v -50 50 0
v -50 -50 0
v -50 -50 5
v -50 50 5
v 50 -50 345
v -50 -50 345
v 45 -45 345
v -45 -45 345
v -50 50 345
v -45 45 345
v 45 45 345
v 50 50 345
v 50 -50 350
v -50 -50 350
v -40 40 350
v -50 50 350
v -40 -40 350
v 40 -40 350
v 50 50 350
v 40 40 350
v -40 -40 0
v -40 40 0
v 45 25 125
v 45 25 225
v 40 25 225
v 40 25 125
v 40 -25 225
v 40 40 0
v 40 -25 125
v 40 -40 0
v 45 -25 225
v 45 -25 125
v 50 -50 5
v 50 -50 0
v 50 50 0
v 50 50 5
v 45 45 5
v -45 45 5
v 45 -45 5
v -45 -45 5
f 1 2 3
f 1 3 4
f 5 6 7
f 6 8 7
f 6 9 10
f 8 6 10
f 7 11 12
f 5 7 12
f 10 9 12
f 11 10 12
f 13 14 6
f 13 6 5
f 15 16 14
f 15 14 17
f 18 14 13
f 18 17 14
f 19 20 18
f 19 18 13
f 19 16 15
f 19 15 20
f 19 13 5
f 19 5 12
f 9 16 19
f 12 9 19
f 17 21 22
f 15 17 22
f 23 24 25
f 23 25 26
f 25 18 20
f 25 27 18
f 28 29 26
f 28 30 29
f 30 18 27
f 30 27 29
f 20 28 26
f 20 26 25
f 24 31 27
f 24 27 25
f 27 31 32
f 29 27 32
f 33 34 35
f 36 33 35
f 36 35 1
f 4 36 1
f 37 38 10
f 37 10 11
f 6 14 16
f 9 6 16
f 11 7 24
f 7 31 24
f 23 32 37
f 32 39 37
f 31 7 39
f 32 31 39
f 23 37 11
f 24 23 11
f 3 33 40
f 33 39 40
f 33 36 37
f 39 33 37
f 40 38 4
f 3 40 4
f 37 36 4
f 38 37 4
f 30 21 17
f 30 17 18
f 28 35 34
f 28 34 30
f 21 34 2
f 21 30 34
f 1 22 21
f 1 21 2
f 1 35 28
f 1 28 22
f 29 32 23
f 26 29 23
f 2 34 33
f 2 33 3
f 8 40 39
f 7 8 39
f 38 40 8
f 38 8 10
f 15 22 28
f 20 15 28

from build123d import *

# Parameters (mm, degrees)
SKETCH3_W           = 90
SKETCH3_H           = 90
BOSS_EXTRUDE1_DEPTH = 350
SHELL1_T            = -5
SKETCH4_W           = 100
SKETCH4_H           = 50
CUT_EXTRUDE1_DEPTH  = 20
SKETCH5_W           = 100
SKETCH5_H           = 100
SKETCH5_W_2         = 90
SKETCH5_H_2         = 90
BOSS_EXTRUDE2_DEPTH = 5
SKETCH6_W           = 100
SKETCH6_H           = 100
SKETCH6_W_2         = 90
SKETCH6_H_2         = 90
BOSS_EXTRUDE3_DEPTH = 5


with BuildPart() as part:
    # Sketch3 → Boss-Extrude1 (new body)
    with BuildSketch(Plane.XY):
        Rectangle(SKETCH3_W, SKETCH3_H)
    extrude(amount=BOSS_EXTRUDE1_DEPTH)

    # Shell1
    shell1_openings = [part.faces().sort_by_distance(p)[0] for p in [
        (0, 0, 350),
        (0, 0, 0),
    ]]
    offset(amount=SHELL1_T, openings=shell1_openings, kind=Kind.INTERSECTION)

    # Sketch4 → Cut-Extrude1 (cut)
    with BuildSketch(Plane(origin=(45, 0, 0), x_dir=(0, 0, -1), z_dir=(1, 0, 0))):
        with Locations((-175, 0)):
            Rectangle(SKETCH4_W, SKETCH4_H)
    extrude(amount=-CUT_EXTRUDE1_DEPTH, mode=Mode.SUBTRACT)

    # Sketch5 → Boss-Extrude2 (add)
    with BuildSketch(Plane.XY.offset(350)):
        Rectangle(SKETCH5_W, SKETCH5_H)
        Rectangle(SKETCH5_W_2, SKETCH5_H_2, mode=Mode.SUBTRACT)
    extrude(amount=-BOSS_EXTRUDE2_DEPTH)

    # Sketch6 → Boss-Extrude3 (add)
    with BuildSketch(Plane(origin=(0, 0, 0), x_dir=(-1, 0, 0), z_dir=(0, 0, -1))):
        Rectangle(SKETCH6_W, SKETCH6_H)
        Rectangle(SKETCH6_W_2, SKETCH6_H_2, mode=Mode.SUBTRACT)
    extrude(amount=-BOSS_EXTRUDE3_DEPTH)


solid = part.part
